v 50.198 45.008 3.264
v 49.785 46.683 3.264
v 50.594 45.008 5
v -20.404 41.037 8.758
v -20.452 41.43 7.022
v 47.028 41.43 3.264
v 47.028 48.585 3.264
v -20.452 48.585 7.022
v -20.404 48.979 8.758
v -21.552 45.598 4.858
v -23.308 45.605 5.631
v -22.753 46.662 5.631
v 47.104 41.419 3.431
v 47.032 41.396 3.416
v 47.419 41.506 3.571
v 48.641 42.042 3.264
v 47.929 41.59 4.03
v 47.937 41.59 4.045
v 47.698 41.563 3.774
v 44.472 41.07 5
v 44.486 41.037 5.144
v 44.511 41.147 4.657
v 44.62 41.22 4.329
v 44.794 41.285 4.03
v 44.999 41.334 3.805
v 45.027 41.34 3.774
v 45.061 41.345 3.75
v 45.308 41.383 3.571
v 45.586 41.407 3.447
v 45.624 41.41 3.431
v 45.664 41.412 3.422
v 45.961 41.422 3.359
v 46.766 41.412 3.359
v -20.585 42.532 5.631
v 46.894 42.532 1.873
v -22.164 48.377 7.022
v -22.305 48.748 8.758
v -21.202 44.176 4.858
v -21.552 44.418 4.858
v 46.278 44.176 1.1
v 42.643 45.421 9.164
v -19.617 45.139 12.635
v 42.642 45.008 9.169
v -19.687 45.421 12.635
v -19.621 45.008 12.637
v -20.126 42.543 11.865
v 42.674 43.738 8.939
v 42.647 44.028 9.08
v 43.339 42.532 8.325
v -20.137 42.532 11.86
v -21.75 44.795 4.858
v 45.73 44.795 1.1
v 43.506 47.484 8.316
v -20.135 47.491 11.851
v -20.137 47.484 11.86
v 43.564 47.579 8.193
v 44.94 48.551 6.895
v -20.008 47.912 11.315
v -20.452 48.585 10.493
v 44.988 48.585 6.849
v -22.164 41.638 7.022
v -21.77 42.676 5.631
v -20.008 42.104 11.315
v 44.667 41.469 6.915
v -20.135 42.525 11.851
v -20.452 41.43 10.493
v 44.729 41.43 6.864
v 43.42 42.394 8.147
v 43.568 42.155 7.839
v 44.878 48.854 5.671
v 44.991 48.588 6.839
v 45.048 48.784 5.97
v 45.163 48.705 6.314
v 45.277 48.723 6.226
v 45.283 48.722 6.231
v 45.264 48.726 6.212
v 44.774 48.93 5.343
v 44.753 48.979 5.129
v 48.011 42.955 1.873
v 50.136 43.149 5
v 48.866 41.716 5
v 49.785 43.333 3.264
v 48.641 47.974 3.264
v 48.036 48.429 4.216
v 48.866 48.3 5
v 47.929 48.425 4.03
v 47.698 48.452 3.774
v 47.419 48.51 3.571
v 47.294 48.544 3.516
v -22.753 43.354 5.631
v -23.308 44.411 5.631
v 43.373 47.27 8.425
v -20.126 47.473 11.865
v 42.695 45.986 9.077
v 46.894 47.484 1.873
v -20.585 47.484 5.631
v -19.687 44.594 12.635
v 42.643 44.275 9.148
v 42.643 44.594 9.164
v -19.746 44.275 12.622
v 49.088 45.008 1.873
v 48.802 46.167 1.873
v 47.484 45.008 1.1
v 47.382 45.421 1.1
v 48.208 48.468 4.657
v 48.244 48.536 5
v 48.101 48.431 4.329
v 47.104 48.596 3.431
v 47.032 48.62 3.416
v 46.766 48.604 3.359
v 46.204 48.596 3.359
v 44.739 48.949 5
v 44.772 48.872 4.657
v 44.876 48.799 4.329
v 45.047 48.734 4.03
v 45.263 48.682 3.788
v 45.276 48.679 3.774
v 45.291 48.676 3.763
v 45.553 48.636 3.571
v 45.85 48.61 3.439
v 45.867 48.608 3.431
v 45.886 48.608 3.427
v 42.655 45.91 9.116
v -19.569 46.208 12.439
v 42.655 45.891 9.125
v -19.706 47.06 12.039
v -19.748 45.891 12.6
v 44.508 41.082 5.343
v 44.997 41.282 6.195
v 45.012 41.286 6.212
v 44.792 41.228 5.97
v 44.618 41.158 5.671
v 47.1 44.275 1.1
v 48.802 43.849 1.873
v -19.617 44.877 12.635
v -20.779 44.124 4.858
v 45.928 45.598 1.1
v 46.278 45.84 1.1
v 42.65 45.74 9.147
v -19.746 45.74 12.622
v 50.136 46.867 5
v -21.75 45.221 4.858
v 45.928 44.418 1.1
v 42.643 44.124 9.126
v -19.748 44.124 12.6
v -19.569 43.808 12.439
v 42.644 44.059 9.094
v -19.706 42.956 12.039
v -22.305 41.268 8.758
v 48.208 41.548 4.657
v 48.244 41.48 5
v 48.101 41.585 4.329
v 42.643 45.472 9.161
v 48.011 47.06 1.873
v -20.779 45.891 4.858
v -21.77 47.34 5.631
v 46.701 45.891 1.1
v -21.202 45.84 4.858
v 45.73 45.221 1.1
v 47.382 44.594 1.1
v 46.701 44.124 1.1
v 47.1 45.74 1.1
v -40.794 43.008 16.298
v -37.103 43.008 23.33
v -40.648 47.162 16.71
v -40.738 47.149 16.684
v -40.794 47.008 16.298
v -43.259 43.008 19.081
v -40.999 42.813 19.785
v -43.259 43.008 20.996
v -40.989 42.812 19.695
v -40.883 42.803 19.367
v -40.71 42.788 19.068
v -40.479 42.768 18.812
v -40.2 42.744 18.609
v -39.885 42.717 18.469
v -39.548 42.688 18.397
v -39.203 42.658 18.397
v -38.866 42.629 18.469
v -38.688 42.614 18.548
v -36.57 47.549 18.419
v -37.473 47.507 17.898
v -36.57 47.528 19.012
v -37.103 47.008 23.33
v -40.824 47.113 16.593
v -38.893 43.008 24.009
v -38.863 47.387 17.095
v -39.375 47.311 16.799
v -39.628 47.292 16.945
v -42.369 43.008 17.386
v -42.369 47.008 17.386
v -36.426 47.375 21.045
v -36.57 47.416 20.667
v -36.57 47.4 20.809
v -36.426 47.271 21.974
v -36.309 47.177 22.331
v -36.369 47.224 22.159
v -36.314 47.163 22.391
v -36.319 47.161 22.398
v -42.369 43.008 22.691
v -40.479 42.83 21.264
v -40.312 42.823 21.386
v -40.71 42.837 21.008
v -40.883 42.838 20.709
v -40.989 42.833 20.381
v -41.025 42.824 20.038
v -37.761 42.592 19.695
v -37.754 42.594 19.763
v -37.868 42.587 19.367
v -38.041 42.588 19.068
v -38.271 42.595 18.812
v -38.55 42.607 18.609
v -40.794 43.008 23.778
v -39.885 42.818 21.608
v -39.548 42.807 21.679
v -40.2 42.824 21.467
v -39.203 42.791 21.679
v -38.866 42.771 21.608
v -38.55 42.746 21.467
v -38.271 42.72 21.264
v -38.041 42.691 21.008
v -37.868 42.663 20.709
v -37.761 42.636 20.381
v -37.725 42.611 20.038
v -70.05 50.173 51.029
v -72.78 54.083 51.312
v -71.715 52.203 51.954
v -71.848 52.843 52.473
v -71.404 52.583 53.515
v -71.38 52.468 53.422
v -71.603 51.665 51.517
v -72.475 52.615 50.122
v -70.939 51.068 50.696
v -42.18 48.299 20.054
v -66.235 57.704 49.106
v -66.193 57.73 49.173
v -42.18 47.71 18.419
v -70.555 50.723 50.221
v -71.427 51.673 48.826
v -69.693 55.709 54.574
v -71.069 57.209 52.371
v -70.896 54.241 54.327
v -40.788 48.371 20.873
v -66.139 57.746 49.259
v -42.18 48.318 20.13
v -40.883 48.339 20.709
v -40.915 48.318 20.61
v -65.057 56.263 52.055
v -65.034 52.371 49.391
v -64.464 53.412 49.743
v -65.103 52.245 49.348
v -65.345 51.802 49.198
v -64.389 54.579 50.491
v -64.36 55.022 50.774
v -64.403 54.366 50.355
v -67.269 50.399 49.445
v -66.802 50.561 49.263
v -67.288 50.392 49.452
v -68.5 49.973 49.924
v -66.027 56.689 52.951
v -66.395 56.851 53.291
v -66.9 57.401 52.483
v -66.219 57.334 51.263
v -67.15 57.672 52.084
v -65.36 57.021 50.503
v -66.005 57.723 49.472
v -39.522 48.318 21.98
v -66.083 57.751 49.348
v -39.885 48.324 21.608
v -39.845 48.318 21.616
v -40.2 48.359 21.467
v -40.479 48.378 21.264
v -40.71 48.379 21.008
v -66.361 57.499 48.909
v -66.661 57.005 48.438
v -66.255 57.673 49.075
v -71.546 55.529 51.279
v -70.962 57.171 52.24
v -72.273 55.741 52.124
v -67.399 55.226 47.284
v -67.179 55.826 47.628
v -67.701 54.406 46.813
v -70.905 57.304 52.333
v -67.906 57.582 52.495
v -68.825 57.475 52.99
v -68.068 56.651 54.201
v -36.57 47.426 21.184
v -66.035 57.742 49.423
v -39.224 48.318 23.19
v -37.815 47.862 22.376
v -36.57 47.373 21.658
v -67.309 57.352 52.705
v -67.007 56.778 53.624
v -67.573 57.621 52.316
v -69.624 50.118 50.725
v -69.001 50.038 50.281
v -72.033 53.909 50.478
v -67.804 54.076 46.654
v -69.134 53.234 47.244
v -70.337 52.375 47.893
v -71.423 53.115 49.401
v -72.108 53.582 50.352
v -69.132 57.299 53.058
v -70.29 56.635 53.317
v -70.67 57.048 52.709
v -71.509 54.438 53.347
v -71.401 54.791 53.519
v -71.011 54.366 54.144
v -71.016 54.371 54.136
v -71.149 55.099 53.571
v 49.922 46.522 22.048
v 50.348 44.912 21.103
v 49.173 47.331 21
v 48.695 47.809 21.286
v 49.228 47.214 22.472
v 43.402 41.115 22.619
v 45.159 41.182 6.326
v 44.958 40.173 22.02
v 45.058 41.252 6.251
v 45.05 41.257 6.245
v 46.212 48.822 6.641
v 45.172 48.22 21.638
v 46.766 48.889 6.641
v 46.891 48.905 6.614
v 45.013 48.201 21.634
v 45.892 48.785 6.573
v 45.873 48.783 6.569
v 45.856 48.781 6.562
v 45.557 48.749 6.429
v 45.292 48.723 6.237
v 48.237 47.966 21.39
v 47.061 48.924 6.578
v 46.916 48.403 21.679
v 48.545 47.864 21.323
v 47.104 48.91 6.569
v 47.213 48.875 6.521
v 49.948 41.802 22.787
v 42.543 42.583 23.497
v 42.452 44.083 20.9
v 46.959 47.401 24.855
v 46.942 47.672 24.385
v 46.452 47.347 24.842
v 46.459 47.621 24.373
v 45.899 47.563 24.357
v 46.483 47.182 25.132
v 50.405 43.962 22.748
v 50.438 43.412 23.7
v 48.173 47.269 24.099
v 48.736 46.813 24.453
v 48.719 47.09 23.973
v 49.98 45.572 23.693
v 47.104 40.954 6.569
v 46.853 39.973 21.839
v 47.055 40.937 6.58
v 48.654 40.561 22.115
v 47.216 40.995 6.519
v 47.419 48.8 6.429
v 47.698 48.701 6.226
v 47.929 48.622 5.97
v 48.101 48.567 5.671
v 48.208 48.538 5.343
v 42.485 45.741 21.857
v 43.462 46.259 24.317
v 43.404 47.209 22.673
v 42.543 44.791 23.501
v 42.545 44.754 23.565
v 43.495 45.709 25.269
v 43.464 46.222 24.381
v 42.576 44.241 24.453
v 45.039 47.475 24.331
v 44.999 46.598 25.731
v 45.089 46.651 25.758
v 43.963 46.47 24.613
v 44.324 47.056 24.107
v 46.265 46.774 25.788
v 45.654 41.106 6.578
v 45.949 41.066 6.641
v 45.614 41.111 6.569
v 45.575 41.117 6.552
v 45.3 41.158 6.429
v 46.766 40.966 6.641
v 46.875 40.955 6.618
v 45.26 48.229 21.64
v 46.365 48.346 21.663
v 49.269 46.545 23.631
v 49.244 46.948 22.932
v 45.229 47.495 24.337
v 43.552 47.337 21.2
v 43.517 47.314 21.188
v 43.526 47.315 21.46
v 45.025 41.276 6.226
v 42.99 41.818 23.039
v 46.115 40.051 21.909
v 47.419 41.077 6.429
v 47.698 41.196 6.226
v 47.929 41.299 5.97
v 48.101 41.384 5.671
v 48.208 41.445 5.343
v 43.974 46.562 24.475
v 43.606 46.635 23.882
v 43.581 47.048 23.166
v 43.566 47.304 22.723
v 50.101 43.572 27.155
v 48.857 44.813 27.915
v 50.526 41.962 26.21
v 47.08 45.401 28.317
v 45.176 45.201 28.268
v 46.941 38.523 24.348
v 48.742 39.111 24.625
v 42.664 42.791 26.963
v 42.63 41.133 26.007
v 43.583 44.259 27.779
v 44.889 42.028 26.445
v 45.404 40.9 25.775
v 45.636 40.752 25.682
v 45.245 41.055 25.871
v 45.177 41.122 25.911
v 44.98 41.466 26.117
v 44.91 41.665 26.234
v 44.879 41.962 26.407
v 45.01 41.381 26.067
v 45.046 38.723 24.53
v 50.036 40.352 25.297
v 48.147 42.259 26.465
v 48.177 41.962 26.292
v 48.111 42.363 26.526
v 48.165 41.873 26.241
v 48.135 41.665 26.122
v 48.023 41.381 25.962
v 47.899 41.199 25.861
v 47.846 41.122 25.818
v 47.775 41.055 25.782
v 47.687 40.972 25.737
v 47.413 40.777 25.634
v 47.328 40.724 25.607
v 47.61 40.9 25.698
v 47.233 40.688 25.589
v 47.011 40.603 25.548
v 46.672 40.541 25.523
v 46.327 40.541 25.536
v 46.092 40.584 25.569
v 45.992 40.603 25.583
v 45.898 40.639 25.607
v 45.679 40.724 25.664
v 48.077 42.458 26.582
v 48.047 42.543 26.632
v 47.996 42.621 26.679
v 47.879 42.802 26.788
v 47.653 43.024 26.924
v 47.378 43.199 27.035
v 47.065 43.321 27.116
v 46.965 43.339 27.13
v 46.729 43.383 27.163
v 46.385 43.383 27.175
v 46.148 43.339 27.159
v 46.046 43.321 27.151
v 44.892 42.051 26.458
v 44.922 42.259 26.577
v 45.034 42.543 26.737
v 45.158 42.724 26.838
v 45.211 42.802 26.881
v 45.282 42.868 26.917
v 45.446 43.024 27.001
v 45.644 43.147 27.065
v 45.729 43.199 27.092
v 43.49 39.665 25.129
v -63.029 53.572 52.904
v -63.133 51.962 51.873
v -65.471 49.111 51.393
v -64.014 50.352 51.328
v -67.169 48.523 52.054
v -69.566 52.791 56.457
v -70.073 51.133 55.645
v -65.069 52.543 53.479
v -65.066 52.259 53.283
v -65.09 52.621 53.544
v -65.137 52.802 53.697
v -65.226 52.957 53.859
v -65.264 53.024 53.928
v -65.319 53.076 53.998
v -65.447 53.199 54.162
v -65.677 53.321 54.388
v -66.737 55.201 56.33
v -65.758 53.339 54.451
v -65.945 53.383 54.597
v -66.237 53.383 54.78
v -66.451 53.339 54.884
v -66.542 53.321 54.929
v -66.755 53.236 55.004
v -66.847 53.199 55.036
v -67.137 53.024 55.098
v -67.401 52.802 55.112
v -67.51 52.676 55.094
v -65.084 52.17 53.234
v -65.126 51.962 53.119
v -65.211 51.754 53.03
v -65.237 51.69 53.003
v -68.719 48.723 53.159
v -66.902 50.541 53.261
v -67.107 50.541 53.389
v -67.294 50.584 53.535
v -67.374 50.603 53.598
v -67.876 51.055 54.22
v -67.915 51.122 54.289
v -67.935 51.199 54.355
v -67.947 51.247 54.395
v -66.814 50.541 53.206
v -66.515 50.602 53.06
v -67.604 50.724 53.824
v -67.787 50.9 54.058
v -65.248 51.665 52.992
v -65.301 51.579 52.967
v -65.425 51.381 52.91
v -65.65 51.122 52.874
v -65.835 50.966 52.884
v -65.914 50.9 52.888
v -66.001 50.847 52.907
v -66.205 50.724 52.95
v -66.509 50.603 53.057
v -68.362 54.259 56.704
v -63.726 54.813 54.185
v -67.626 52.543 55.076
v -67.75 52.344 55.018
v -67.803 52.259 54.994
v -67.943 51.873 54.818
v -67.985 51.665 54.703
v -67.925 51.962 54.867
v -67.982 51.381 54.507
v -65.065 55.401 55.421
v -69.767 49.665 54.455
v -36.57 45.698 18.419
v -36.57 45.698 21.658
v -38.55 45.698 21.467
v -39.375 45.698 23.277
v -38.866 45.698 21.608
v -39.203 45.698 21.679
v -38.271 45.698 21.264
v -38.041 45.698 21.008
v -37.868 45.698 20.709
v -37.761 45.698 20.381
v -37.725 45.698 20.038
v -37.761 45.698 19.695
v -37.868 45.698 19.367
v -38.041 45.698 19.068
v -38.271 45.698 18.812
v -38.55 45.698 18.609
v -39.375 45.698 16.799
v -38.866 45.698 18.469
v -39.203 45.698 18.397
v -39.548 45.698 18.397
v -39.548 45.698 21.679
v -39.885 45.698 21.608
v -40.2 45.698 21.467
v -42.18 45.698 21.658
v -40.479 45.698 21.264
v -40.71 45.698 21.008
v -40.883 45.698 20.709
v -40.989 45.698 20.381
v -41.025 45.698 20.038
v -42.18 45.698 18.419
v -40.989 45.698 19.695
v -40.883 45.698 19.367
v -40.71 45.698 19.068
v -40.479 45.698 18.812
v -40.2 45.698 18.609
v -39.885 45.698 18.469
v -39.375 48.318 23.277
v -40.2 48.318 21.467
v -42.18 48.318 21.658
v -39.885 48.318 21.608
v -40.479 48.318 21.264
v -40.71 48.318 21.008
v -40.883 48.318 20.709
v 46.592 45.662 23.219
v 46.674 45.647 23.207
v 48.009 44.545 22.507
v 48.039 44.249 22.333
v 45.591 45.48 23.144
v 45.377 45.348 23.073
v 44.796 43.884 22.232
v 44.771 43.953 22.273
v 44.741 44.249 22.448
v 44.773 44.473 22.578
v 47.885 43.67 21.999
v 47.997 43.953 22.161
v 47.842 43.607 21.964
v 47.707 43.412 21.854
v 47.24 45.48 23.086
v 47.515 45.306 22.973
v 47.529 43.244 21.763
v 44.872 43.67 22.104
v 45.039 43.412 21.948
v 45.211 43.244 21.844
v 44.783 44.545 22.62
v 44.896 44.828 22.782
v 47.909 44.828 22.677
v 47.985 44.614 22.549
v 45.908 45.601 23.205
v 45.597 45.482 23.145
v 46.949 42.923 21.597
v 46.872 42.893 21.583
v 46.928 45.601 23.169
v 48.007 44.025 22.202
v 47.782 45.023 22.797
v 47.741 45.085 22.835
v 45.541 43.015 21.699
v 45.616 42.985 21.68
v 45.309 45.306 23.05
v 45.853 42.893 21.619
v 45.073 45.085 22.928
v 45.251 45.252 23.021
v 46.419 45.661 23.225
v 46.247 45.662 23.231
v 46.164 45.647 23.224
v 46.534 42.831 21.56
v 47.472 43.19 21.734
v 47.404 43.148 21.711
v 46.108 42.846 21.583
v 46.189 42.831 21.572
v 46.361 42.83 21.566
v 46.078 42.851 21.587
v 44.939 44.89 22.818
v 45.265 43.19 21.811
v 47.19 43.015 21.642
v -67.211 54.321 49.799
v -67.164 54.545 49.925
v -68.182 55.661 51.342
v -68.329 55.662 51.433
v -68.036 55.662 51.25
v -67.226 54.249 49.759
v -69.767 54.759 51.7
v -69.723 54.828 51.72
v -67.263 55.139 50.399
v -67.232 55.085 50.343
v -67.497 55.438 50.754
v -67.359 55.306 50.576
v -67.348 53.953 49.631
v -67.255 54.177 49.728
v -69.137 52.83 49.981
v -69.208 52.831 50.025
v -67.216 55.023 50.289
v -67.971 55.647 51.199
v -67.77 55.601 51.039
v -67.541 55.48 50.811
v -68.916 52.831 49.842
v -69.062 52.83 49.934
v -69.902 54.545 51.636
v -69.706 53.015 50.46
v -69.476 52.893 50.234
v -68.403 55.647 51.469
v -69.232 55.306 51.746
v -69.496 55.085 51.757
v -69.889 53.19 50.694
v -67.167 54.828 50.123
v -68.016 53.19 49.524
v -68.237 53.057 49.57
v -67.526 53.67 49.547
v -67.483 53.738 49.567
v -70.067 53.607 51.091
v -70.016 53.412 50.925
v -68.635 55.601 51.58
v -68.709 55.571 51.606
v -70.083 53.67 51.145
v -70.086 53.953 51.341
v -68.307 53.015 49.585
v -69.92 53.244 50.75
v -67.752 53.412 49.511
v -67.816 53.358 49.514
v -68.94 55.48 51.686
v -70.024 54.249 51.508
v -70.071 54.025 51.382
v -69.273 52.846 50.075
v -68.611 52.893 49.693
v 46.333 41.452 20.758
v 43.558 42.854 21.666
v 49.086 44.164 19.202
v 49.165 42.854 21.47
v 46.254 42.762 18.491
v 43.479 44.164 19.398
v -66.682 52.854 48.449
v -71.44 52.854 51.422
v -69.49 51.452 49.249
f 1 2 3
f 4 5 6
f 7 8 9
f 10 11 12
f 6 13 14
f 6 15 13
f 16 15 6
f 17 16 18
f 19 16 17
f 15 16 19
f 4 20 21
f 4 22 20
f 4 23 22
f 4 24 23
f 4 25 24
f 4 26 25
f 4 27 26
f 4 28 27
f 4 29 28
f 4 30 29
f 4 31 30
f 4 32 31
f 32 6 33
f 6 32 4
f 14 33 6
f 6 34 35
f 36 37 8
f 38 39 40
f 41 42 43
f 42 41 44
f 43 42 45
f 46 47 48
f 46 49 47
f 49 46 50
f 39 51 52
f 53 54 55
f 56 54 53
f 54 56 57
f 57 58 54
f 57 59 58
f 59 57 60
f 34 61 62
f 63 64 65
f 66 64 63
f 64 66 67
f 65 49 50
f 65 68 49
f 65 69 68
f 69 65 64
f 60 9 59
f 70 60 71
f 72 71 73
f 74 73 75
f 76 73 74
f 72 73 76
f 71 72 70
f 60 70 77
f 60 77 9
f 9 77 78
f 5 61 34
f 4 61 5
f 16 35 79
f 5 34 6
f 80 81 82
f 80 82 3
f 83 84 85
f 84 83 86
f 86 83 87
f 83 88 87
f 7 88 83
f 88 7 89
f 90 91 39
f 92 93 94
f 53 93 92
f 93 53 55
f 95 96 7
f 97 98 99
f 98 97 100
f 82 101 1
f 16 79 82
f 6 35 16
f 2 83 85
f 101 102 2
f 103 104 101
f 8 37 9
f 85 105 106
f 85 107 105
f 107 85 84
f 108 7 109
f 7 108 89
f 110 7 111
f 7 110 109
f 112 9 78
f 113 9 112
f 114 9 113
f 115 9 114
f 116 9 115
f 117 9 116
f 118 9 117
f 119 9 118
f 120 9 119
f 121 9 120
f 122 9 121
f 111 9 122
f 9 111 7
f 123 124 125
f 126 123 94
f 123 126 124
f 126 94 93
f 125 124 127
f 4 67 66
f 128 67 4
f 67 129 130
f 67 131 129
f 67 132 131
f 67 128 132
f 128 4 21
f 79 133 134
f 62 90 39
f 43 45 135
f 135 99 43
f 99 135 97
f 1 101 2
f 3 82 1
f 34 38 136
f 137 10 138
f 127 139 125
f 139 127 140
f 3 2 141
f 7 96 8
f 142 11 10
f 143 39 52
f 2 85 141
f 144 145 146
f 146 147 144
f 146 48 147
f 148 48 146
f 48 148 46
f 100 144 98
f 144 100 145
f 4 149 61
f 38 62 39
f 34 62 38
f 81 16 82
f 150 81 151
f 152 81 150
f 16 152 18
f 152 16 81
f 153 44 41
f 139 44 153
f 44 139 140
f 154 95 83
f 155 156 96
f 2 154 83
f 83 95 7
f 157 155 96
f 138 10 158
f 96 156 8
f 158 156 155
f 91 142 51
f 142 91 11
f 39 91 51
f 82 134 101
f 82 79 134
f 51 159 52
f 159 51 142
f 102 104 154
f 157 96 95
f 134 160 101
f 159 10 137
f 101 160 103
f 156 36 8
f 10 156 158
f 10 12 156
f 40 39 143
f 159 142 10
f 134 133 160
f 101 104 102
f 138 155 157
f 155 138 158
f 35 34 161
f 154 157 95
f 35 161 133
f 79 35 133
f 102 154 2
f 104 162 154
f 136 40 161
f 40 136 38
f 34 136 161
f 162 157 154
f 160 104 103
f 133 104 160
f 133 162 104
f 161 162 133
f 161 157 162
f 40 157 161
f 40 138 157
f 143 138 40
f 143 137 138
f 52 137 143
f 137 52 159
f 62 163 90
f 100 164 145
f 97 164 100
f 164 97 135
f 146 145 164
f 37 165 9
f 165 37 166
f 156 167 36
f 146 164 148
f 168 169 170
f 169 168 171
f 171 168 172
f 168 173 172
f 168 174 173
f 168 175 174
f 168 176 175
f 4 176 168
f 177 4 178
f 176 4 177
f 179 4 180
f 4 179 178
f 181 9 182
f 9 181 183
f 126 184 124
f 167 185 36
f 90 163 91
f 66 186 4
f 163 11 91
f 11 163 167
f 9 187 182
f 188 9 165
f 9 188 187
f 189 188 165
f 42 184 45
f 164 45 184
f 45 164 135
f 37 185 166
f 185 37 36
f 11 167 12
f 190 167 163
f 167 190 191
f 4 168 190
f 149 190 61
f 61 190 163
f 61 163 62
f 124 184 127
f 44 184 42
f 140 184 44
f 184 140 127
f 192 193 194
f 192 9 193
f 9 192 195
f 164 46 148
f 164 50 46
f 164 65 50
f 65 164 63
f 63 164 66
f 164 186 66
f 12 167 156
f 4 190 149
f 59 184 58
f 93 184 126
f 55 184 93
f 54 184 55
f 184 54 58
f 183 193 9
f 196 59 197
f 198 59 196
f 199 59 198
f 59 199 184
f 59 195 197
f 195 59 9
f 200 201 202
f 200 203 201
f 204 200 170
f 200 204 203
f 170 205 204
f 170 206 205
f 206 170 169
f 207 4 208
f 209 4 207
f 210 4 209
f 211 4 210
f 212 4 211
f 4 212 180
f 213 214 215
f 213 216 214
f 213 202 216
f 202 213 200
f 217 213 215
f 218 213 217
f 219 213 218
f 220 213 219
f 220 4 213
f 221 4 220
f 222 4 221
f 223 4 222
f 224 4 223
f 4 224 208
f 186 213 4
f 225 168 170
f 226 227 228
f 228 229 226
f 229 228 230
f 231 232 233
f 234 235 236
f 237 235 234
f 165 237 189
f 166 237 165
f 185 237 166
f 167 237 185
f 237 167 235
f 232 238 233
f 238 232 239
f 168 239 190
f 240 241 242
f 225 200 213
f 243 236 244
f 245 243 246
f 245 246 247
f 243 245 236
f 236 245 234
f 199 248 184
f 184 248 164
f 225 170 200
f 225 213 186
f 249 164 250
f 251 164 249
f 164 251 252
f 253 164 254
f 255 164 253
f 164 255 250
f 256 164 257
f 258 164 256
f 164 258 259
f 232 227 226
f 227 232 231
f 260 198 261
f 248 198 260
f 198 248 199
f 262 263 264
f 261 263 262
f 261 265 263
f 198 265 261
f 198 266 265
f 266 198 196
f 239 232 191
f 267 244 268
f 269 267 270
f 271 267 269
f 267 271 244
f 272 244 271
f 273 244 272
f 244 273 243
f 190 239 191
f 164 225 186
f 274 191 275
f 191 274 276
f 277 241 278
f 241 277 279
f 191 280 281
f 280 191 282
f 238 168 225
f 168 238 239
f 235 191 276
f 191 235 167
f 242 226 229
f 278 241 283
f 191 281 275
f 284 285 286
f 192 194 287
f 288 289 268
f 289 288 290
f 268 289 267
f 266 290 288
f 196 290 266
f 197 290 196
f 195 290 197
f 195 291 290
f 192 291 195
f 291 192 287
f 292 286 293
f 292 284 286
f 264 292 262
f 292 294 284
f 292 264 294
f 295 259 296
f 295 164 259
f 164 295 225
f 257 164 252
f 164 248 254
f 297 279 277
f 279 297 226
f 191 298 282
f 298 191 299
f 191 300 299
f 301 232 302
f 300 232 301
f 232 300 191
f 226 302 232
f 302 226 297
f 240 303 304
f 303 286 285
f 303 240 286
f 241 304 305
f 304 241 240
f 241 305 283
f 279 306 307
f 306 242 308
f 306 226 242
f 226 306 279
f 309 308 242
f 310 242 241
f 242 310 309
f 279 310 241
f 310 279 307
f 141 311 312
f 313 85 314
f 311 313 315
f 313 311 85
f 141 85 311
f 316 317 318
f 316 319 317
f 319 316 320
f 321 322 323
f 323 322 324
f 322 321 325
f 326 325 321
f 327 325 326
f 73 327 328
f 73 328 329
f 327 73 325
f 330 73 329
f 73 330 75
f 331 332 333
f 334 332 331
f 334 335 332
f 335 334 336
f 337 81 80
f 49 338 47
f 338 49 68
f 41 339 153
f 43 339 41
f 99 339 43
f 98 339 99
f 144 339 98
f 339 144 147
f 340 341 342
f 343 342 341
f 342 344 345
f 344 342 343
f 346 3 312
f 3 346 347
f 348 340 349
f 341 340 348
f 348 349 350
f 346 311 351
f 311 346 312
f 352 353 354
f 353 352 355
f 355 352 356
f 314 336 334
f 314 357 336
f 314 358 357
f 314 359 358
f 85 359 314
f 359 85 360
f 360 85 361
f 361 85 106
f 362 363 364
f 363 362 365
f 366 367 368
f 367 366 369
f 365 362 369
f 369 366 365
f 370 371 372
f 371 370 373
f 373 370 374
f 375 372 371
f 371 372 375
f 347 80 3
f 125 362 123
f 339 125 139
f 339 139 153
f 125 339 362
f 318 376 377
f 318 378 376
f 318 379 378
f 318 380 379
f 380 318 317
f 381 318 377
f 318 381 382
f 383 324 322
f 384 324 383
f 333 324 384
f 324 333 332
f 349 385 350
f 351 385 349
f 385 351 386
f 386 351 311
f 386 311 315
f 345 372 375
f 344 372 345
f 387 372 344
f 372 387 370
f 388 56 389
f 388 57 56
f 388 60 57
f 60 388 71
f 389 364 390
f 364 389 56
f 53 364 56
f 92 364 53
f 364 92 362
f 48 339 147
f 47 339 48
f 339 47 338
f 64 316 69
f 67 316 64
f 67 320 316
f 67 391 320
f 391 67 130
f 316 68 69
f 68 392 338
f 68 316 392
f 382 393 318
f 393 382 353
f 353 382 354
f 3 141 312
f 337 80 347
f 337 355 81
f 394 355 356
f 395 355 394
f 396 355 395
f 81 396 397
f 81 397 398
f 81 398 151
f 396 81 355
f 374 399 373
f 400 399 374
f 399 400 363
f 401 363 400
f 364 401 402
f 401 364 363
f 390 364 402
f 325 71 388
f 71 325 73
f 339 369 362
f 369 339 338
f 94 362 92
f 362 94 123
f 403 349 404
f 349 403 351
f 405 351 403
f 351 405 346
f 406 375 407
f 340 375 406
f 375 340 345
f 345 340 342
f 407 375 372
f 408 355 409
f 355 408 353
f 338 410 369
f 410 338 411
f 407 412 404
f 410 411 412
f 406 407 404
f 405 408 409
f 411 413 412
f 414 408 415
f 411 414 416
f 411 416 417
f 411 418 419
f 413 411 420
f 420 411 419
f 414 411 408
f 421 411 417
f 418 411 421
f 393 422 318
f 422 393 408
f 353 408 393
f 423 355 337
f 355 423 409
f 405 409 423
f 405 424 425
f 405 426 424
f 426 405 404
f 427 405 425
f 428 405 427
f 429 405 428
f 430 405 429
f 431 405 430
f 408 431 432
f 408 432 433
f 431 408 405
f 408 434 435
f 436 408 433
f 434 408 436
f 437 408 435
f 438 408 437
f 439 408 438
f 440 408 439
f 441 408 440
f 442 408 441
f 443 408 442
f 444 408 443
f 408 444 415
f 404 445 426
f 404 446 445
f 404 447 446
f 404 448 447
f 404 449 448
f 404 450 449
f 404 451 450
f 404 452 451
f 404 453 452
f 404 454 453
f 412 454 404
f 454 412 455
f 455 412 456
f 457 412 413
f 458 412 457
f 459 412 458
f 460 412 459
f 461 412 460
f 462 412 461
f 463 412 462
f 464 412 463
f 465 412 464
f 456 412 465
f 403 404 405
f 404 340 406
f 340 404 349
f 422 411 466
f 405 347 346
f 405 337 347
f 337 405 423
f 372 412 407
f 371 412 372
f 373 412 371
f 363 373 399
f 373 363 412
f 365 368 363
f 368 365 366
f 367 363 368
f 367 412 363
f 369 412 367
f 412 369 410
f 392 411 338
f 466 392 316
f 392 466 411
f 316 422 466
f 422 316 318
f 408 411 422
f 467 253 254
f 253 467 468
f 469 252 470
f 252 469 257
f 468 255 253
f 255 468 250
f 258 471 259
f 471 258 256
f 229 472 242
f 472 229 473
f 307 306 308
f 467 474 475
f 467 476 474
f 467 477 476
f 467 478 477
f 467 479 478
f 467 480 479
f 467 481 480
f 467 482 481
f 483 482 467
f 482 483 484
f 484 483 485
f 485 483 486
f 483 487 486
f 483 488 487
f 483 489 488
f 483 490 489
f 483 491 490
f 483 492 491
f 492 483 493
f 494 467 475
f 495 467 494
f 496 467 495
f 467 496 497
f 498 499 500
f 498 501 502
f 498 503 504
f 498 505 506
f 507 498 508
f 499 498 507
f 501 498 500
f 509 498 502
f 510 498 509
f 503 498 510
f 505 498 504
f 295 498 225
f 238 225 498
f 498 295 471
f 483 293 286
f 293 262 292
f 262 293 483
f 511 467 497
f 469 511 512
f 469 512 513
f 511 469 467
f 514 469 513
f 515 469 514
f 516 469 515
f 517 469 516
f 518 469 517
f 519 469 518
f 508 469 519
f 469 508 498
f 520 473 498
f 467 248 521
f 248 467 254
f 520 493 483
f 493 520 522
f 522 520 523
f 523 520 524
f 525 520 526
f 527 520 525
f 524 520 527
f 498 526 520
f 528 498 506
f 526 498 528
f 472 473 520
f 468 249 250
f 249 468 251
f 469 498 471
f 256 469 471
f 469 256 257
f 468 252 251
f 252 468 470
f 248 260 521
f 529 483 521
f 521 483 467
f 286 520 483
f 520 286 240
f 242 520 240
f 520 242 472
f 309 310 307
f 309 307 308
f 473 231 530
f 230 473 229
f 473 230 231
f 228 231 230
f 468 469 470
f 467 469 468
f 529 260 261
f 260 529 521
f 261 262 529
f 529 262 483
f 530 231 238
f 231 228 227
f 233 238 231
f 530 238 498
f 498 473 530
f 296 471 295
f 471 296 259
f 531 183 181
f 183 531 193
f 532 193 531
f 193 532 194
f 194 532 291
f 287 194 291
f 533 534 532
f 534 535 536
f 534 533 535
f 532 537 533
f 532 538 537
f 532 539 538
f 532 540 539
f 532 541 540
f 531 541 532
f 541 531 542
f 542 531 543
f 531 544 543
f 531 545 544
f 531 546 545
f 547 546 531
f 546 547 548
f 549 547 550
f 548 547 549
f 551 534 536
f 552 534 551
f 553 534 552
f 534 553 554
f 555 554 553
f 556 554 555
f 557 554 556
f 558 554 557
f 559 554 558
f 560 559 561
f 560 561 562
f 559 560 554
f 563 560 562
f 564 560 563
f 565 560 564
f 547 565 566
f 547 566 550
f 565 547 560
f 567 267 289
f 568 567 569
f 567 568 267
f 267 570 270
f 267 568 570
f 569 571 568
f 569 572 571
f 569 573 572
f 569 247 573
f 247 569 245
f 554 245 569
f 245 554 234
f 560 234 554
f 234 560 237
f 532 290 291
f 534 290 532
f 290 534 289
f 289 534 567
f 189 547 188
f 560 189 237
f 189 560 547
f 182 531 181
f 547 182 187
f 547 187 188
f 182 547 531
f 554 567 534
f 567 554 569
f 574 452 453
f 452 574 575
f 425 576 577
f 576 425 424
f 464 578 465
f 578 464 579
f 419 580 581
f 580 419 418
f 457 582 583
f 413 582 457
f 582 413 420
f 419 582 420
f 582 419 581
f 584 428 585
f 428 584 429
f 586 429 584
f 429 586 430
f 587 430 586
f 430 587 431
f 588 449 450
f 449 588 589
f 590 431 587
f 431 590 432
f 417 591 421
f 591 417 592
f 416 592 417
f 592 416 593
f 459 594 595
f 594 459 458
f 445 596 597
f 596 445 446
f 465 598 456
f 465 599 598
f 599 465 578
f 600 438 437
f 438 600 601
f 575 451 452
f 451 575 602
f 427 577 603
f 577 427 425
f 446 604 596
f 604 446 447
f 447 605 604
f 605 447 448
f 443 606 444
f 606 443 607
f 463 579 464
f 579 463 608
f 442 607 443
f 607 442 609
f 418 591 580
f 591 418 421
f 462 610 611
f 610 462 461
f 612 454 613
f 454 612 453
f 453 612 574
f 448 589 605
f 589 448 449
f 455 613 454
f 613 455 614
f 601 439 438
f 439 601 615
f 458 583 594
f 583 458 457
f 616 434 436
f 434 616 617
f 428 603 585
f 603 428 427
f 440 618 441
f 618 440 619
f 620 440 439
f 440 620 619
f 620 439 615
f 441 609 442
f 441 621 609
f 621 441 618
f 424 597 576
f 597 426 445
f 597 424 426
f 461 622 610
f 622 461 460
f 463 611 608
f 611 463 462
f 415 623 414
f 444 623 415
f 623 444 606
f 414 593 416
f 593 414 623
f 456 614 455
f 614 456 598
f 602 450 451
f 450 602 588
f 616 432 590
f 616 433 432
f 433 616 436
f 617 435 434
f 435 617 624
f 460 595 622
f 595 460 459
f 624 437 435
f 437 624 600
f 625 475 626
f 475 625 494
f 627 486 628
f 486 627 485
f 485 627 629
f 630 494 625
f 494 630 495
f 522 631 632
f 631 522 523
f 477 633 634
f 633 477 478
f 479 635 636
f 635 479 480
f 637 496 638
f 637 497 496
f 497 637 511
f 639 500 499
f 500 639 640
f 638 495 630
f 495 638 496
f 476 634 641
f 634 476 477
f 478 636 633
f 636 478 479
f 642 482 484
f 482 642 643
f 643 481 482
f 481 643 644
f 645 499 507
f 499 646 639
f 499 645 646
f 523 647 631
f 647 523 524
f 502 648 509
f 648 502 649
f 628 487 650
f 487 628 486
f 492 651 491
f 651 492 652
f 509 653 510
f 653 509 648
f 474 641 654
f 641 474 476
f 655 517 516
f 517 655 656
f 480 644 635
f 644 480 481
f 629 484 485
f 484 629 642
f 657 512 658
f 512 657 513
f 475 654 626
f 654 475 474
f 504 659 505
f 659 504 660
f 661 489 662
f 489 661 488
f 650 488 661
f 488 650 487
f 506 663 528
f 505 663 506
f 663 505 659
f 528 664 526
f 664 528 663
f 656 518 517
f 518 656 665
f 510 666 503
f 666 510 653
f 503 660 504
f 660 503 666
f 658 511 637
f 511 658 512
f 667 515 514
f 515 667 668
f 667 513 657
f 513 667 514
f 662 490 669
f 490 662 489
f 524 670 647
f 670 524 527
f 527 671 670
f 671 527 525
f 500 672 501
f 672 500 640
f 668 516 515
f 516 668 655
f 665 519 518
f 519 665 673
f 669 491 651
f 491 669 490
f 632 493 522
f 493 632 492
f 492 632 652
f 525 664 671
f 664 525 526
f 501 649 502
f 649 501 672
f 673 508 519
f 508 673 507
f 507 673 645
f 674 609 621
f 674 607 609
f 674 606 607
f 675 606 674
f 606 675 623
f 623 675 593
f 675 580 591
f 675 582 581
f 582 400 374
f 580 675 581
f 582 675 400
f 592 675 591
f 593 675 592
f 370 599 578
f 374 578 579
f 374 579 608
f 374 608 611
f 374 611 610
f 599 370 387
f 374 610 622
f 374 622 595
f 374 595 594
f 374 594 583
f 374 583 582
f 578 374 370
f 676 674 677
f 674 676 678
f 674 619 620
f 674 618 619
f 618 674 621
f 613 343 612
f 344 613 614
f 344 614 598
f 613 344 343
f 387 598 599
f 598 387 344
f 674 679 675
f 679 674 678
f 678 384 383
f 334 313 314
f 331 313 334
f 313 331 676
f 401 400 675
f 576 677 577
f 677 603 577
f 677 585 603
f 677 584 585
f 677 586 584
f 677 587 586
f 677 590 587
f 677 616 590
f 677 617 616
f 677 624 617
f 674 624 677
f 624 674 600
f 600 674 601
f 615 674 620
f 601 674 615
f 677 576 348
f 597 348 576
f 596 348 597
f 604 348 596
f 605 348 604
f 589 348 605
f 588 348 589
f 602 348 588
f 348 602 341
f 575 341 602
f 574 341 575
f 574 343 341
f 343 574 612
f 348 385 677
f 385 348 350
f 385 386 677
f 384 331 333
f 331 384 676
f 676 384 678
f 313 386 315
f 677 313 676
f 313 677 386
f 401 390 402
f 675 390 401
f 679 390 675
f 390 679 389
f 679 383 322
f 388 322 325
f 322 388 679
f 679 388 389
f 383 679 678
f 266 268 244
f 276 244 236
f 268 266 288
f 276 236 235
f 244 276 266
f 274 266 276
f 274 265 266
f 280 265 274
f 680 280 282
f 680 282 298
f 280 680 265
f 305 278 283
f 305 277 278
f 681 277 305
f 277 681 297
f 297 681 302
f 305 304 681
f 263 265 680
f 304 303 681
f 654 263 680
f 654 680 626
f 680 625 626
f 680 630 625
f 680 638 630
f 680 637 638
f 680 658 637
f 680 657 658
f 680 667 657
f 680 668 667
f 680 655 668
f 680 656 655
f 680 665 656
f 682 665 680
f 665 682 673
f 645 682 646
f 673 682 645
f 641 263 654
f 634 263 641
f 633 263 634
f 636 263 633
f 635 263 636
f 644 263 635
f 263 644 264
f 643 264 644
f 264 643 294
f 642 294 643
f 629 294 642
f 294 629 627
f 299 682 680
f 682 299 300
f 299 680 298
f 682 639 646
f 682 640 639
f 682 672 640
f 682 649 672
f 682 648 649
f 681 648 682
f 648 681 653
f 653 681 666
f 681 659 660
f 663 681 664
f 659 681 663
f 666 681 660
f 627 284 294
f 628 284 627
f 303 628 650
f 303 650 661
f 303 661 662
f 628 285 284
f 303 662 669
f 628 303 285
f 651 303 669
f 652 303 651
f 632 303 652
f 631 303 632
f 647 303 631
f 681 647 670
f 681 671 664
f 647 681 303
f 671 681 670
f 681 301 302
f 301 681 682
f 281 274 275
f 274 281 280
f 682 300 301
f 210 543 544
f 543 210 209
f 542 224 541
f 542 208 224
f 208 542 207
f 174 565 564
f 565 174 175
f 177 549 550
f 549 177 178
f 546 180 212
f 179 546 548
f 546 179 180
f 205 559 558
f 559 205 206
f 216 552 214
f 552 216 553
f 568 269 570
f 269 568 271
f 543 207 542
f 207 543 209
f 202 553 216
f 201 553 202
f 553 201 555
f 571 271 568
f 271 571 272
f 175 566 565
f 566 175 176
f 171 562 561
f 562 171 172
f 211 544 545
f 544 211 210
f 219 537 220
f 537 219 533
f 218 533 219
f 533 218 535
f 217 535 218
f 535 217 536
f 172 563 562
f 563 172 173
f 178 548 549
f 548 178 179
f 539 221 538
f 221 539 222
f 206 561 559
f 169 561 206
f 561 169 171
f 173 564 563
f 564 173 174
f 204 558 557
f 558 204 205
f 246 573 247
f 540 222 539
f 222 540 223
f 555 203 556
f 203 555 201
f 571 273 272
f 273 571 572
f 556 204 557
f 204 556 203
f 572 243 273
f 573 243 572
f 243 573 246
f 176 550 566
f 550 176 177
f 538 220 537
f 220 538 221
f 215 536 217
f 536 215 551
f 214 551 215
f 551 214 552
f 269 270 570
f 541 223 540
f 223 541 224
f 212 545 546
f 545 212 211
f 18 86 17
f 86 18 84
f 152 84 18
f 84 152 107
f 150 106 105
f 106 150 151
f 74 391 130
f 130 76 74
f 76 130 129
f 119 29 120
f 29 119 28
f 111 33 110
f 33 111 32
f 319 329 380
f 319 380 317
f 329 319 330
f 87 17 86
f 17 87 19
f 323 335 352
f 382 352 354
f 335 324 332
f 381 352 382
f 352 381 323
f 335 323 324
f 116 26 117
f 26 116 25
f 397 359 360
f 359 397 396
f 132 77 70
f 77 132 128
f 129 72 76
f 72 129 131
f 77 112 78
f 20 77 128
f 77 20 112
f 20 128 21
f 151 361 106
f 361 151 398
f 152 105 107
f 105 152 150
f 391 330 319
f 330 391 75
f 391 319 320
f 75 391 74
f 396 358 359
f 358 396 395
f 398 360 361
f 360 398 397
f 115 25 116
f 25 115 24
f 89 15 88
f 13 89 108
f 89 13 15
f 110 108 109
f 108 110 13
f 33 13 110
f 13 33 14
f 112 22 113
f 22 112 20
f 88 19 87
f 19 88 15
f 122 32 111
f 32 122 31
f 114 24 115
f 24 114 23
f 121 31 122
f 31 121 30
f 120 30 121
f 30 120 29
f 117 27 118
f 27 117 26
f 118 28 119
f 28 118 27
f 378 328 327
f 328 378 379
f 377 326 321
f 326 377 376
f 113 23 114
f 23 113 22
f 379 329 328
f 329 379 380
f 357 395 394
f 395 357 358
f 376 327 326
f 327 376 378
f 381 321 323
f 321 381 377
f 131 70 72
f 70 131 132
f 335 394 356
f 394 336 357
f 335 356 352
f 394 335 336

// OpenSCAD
difference () {
  union () {

    hull () {
      translate ([46.59388020145215, 45.007811226975086, 5.0]) {
        sphere (r=4);
      }
      translate ([0, 0, 8]) {
        rotate (a=12.0, v=[0, 1, 0]) {
          translate ([0, -12, 5.64]) {
            translate ([0, 0, 236.2124823694608]) {
              rotate (a=-10.0, v=[0, 1, 0]) {
                translate ([0, 0, -236.2124823694608]) {
                  translate ([0, 0, 84.31095110414394]) {
                    rotate (a=29.999999999999996, v=[1, 0, 0]) {
                      translate ([3.8625, 0, -84.31095110414394]) {
                        translate ([0, 0, -4.5]) {
                          translate ([0, 13.575, 0]) {
                            cylinder (h=3, r=4, center=true);
                          }
                        }
                      }
                    }
                  }
                }
              }
            }
          }
        }
      }
    }
    translate ([0, 0, 8]) {
      rotate (a=12.0, v=[0, 1, 0]) {
        translate ([0, -12, 5.64]) {
          translate ([0, 0, 236.2124823694608]) {
            rotate (a=-10.0, v=[0, 1, 0]) {
              translate ([0, 0, -236.2124823694608]) {
                translate ([0, 0, 84.31095110414394]) {
                  rotate (a=29.999999999999996, v=[1, 0, 0]) {
                    translate ([3.8625, 0, -84.31095110414394]) {
                      translate ([0, 0, -2.0999999999999996]) {
                        translate ([0, 13.575, 0]) {
                          cylinder (h=4, r=4, center=true);
                        }
                      }
                    }
                  }
                }
              }
            }
          }
        }
      }
    }
    union () {
      hull () {
        translate ([46.59388020145215, 45.007811226975086, 5.0]) {
          sphere (r=4);
        }
        translate ([-20.8861121541338, 45.007811226975086, 8.757888382012283]) {
          sphere (r=4);
        }
      }
      hull () {
        translate ([-20.8861121541338, 45.007811226975086, 8.757888382012283]) {
          sphere (r=4);
        }
        translate ([-39.37541674104513, 45.007811226975086, 20.03827299295847]) {
          rotate (a=90.0, v=[1, 0, 0]) {
            cylinder (h=4, r=4, center=true);
          }
        }
      }
      hull () {
        translate ([-39.37541674104513, 45.007811226975086, 20.03827299295847]) {
          rotate (a=90.0, v=[1, 0, 0]) {
            cylinder (h=4, r=4, center=true);
          }
        }
        translate ([0, 0, 8]) {
          rotate (a=12.0, v=[0, 1, 0]) {
            translate ([0, -2, 0]) {
              translate ([0, 0, 236.2124823694608]) {
                rotate (a=20.0, v=[0, 1, 0]) {
                  translate ([0, 0, -236.2124823694608]) {
                    translate ([0, 0, 84.31095110414394]) {
                      rotate (a=29.999999999999996, v=[1, 0, 0]) {
                        translate ([0, 0, -84.31095110414394]) {
                          translate ([0, 0, -4.5]) {
                            translate ([0, 13.575, 0]) {
                              cylinder (h=3, r=4, center=true);
                            }
                          }
                        }
                      }
                    }
                  }
                }
              }
            }
          }
        }
      }
    }
    translate ([0, 0, 8]) {
      rotate (a=12.0, v=[0, 1, 0]) {
        translate ([0, -2, 0]) {
          translate ([0, 0, 236.2124823694608]) {
            rotate (a=20.0, v=[0, 1, 0]) {
              translate ([0, 0, -236.2124823694608]) {
                translate ([0, 0, 84.31095110414394]) {
                  rotate (a=29.999999999999996, v=[1, 0, 0]) {
                    translate ([0, 0, -84.31095110414394]) {
                      translate ([0, 0, -2.0999999999999996]) {
                        translate ([0, 13.575, 0]) {
                          cylinder (h=4, r=4, center=true);
                        }
                      }
                    }
                  }
                }
              }
            }
          }
        }
      }
    }


  }
  union () {
    translate ([0, 0, 8]) {
      rotate (a=12.0, v=[0, 1, 0]) {
        translate ([0, -12, 5.64]) {
          translate ([0, 0, 236.2124823694608]) {
            rotate (a=-10.0, v=[0, 1, 0]) {
              translate ([0, 0, -236.2124823694608]) {
                translate ([0, 0, 84.31095110414394]) {
                  rotate (a=-29.999999999999996, v=[1, 0, 0]) {
                    translate ([0, 0, -84.31095110414394]) {
                      translate ([0, 0, -2.0999999999999996]) {
                        translate ([0, -13.575, 0]) {
                          cylinder ($fn=30, h=10, r=1.65, center=true);
                        }
                      }
                    }
                  }
                }
              }
            }
          }
        }
      }
    }
    translate ([0, 0, 8]) {
      rotate (a=12.0, v=[0, 1, 0]) {
        translate ([0, -12, 5.64]) {
          translate ([0, 0, 236.2124823694608]) {
            rotate (a=-10.0, v=[0, 1, 0]) {
              translate ([0, 0, -236.2124823694608]) {
                translate ([0, 0, 84.31095110414394]) {
                  rotate (a=29.999999999999996, v=[1, 0, 0]) {
                    translate ([3.8625, 0, -84.31095110414394]) {
                      translate ([0, 0, -2.0999999999999996]) {
                        translate ([0, 13.575, 0]) {
                          cylinder ($fn=30, h=10, r=1.65, center=true);
                        }
                      }
                    }
                  }
                }
              }
            }
          }
        }
      }
    }
    translate ([0, 0, 8]) {
      rotate (a=12.0, v=[0, 1, 0]) {
        translate ([0, -2, 0]) {
          translate ([0, 0, 236.2124823694608]) {
            rotate (a=20.0, v=[0, 1, 0]) {
              translate ([0, 0, -236.2124823694608]) {
                translate ([0, 0, 84.31095110414394]) {
                  rotate (a=29.999999999999996, v=[1, 0, 0]) {
                    translate ([0, 0, -84.31095110414394]) {
                      translate ([0, 0, -2.0999999999999996]) {
                        translate ([0, 13.575, 0]) {
                          cylinder ($fn=30, h=10, r=1.65, center=true);
                        }
                      }
                    }
                  }
                }
              }
            }
          }
        }
      }
    }
    translate ([0, 0, 8]) {
      rotate (a=12.0, v=[0, 1, 0]) {
        translate ([0, 0, 0]) {
          translate ([0, 0, 236.2124823694608]) {
            rotate (a=10.0, v=[0, 1, 0]) {
              translate ([0, 0, -236.2124823694608]) {
                translate ([0, 0, 84.31095110414394]) {
                  rotate (a=-14.999999999999998, v=[1, 0, 0]) {
                    translate ([0, 0, -84.31095110414394]) {
                      translate ([0, 0, -2.0999999999999996]) {
                        translate ([0, -13.575, 0]) {
                          cylinder ($fn=30, h=10, r=1.65, center=true);
                        }
                      }
                    }
                  }
                }
              }
            }
          }
        }
      }
    }
    translate ([0, 0, 8]) {
      rotate (a=12.0, v=[0, 1, 0]) {
        translate ([0, -12, 5.64]) {
          translate ([0, 0, 236.2124823694608]) {
            rotate (a=-10.0, v=[0, 1, 0]) {
              translate ([0, 0, -236.2124823694608]) {
                translate ([0, 0, 84.31095110414394]) {
                  rotate (a=29.999999999999996, v=[1, 0, 0]) {
                    translate ([3.8625, 0, -84.31095110414394]) {
                      hull () {
                        translate ([0, 0, -6]) {
                          translate ([0, 28.575, 0]) {
                            union () {
                              cube ([5.81, 3.3544050639917264, 2.82], center=true);
                              rotate (a=59.99999999999999, v=[0, 0, 1]) {
                                cube ([5.81, 3.3544050639917264, 2.82], center=true);
                              }
                              rotate (a=-59.99999999999999, v=[0, 0, 1]) {
                                cube ([5.81, 3.3544050639917264, 2.82], center=true);
                              }
                            }
                          }
                        }
                        translate ([0, 0, -6]) {
                          translate ([0, 13.575, 0]) {
                            union () {
                              cube ([5.609999999999999, 3.238935010153801, 2.6199999999999997], center=true);
                              rotate (a=59.99999999999999, v=[0, 0, 1]) {
                                cube ([5.609999999999999, 3.238935010153801, 2.6199999999999997], center=true);
                              }
                              rotate (a=-59.99999999999999, v=[0, 0, 1]) {
                                cube ([5.609999999999999, 3.238935010153801, 2.6199999999999997], center=true);
                              }
                            }
                          }
                        }
                      }
                    }
                  }
                }
              }
            }
          }
        }
      }
    }
    translate ([0, 0, 8]) {
      rotate (a=12.0, v=[0, 1, 0]) {
        translate ([0, -12, 5.64]) {
          translate ([0, 0, 236.2124823694608]) {
            rotate (a=-10.0, v=[0, 1, 0]) {
              translate ([0, 0, -236.2124823694608]) {
                translate ([0, 0, 84.31095110414394]) {
                  rotate (a=-29.999999999999996, v=[1, 0, 0]) {
                    translate ([0, 0, -84.31095110414394]) {
                      hull () {
                        translate ([0, 0, -6]) {
                          translate ([0, -28.575, 0]) {
                            union () {
                              cube ([5.81, 3.3544050639917264, 2.82], center=true);
                              rotate (a=59.99999999999999, v=[0, 0, 1]) {
                                cube ([5.81, 3.3544050639917264, 2.82], center=true);
                              }
                              rotate (a=-59.99999999999999, v=[0, 0, 1]) {
                                cube ([5.81, 3.3544050639917264, 2.82], center=true);
                              }
                            }
                          }
                        }
                        translate ([0, 0, -6]) {
                          translate ([0, -13.575, 0]) {
                            union () {
                              cube ([5.609999999999999, 3.238935010153801, 2.6199999999999997], center=true);
                              rotate (a=59.99999999999999, v=[0, 0, 1]) {
                                cube ([5.609999999999999, 3.238935010153801, 2.6199999999999997], center=true);
                              }
                              rotate (a=-59.99999999999999, v=[0, 0, 1]) {
                                cube ([5.609999999999999, 3.238935010153801, 2.6199999999999997], center=true);
                              }
                            }
                          }
                        }
                      }
                    }
                  }
                }
              }
            }
          }
        }
      }
    }
    translate ([0, 0, 8]) {
      rotate (a=12.0, v=[0, 1, 0]) {
        translate ([0, -2, 0]) {
          translate ([0, 0, 236.2124823694608]) {
            rotate (a=20.0, v=[0, 1, 0]) {
              translate ([0, 0, -236.2124823694608]) {
                translate ([0, 0, 84.31095110414394]) {
                  rotate (a=29.999999999999996, v=[1, 0, 0]) {
                    translate ([0, 0, -84.31095110414394]) {
                      hull () {
                        translate ([0, 0, -6]) {
                          translate ([0, 28.575, 0]) {
                            union () {
                              cube ([5.81, 3.3544050639917264, 2.82], center=true);
                              rotate (a=59.99999999999999, v=[0, 0, 1]) {
                                cube ([5.81, 3.3544050639917264, 2.82], center=true);
                              }
                              rotate (a=-59.99999999999999, v=[0, 0, 1]) {
                                cube ([5.81, 3.3544050639917264, 2.82], center=true);
                              }
                            }
                          }
                        }
                        translate ([0, 0, -6]) {
                          translate ([0, 13.575, 0]) {
                            union () {
                              cube ([5.609999999999999, 3.238935010153801, 2.6199999999999997], center=true);
                              rotate (a=59.99999999999999, v=[0, 0, 1]) {
                                cube ([5.609999999999999, 3.238935010153801, 2.6199999999999997], center=true);
                              }
                              rotate (a=-59.99999999999999, v=[0, 0, 1]) {
                                cube ([5.609999999999999, 3.238935010153801, 2.6199999999999997], center=true);
                              }
                            }
                          }
                        }
                      }
                    }
                  }
                }
              }
            }
          }
        }
      }
    }
    translate ([0, 0, 8]) {
      rotate (a=12.0, v=[0, 1, 0]) {
        translate ([0, 0, 0]) {
          translate ([0, 0, 236.2124823694608]) {
            rotate (a=10.0, v=[0, 1, 0]) {
              translate ([0, 0, -236.2124823694608]) {
                translate ([0, 0, 84.31095110414394]) {
                  rotate (a=-14.999999999999998, v=[1, 0, 0]) {
                    translate ([0, 0, -84.31095110414394]) {
                      hull () {
                        translate ([0, 0, -6]) {
                          translate ([0, -28.575, 0]) {
                            union () {
                              cube ([5.81, 3.3544050639917264, 2.82], center=true);
                              rotate (a=59.99999999999999, v=[0, 0, 1]) {
                                cube ([5.81, 3.3544050639917264, 2.82], center=true);
                              }
                              rotate (a=-59.99999999999999, v=[0, 0, 1]) {
                                cube ([5.81, 3.3544050639917264, 2.82], center=true);
                              }
                            }
                          }
                        }
                        translate ([0, 0, -6]) {
                          translate ([0, -13.575, 0]) {
                            union () {
                              cube ([5.609999999999999, 3.238935010153801, 2.6199999999999997], center=true);
                              rotate (a=59.99999999999999, v=[0, 0, 1]) {
                                cube ([5.609999999999999, 3.238935010153801, 2.6199999999999997], center=true);
                              }
                              rotate (a=-59.99999999999999, v=[0, 0, 1]) {
                                cube ([5.609999999999999, 3.238935010153801, 2.6199999999999997], center=true);
                              }
                            }
                          }
                        }
                      }
                    }
                  }
                }
              }
            }
          }
        }
      }
    }
    translate ([0, 2, 0]) {
      translate ([-39.37541674104513, 45.007811226975086, 20.03827299295847]) {
        rotate (a=90.0, v=[1, 0, 0]) {
          union () {
            cube ([5.609999999999999, 3.238935010153801, 2.6199999999999997], center=true);
            rotate (a=59.99999999999999, v=[0, 0, 1]) {
              cube ([5.609999999999999, 3.238935010153801, 2.6199999999999997], center=true);
            }
            rotate (a=-59.99999999999999, v=[0, 0, 1]) {
              cube ([5.609999999999999, 3.238935010153801, 2.6199999999999997], center=true);
            }
          }
        }
      }
    }
    translate ([0, -3.0, 0]) {
      translate ([-39.37541674104513, -34.50390561348755, 10.038272992958468]) {
        rotate (a=-90.0, v=[1, 0, 0]) {
          union () {
            cube ([5.609999999999999, 3.238935010153801, 2.6199999999999997], center=true);
            rotate (a=59.99999999999999, v=[0, 0, 1]) {
              cube ([5.609999999999999, 3.238935010153801, 2.6199999999999997], center=true);
            }
            rotate (a=-59.99999999999999, v=[0, 0, 1]) {
              cube ([5.609999999999999, 3.238935010153801, 2.6199999999999997], center=true);
            }
          }
        }
      }
    }
    hull () {
      translate ([-39.37541674104513, 45.007811226975086, 20.03827299295847]) {
        rotate (a=90.0, v=[1, 0, 0]) {
          cylinder ($fn=30, h=20, r=1.65, center=true);
        }
      }
  } hull() {
      translate ([-39.37541674104513, -34.50390561348755, 10.038272992958468]) {
        rotate (a=90.0, v=[1, 0, 0]) {
          cylinder ($fn=30, h=20, r=1.65, center=true);
        }
      }
    }
    hull () {
      translate ([46.59388020145215, 45.007811226975086, 5.0]) {
        rotate (a=90.0, v=[1, 0, 0]) {
          cylinder ($fn=30, h=20, r=1.65, center=true);
        }
      }
      translate ([42.73373313209089, -69.0078112269751, 5.0]) {
        rotate (a=90.0, v=[1, 0, 0]) {
          cylinder ($fn=30, h=20, r=1.65, center=true);
        }
      }
    }
  }
}
